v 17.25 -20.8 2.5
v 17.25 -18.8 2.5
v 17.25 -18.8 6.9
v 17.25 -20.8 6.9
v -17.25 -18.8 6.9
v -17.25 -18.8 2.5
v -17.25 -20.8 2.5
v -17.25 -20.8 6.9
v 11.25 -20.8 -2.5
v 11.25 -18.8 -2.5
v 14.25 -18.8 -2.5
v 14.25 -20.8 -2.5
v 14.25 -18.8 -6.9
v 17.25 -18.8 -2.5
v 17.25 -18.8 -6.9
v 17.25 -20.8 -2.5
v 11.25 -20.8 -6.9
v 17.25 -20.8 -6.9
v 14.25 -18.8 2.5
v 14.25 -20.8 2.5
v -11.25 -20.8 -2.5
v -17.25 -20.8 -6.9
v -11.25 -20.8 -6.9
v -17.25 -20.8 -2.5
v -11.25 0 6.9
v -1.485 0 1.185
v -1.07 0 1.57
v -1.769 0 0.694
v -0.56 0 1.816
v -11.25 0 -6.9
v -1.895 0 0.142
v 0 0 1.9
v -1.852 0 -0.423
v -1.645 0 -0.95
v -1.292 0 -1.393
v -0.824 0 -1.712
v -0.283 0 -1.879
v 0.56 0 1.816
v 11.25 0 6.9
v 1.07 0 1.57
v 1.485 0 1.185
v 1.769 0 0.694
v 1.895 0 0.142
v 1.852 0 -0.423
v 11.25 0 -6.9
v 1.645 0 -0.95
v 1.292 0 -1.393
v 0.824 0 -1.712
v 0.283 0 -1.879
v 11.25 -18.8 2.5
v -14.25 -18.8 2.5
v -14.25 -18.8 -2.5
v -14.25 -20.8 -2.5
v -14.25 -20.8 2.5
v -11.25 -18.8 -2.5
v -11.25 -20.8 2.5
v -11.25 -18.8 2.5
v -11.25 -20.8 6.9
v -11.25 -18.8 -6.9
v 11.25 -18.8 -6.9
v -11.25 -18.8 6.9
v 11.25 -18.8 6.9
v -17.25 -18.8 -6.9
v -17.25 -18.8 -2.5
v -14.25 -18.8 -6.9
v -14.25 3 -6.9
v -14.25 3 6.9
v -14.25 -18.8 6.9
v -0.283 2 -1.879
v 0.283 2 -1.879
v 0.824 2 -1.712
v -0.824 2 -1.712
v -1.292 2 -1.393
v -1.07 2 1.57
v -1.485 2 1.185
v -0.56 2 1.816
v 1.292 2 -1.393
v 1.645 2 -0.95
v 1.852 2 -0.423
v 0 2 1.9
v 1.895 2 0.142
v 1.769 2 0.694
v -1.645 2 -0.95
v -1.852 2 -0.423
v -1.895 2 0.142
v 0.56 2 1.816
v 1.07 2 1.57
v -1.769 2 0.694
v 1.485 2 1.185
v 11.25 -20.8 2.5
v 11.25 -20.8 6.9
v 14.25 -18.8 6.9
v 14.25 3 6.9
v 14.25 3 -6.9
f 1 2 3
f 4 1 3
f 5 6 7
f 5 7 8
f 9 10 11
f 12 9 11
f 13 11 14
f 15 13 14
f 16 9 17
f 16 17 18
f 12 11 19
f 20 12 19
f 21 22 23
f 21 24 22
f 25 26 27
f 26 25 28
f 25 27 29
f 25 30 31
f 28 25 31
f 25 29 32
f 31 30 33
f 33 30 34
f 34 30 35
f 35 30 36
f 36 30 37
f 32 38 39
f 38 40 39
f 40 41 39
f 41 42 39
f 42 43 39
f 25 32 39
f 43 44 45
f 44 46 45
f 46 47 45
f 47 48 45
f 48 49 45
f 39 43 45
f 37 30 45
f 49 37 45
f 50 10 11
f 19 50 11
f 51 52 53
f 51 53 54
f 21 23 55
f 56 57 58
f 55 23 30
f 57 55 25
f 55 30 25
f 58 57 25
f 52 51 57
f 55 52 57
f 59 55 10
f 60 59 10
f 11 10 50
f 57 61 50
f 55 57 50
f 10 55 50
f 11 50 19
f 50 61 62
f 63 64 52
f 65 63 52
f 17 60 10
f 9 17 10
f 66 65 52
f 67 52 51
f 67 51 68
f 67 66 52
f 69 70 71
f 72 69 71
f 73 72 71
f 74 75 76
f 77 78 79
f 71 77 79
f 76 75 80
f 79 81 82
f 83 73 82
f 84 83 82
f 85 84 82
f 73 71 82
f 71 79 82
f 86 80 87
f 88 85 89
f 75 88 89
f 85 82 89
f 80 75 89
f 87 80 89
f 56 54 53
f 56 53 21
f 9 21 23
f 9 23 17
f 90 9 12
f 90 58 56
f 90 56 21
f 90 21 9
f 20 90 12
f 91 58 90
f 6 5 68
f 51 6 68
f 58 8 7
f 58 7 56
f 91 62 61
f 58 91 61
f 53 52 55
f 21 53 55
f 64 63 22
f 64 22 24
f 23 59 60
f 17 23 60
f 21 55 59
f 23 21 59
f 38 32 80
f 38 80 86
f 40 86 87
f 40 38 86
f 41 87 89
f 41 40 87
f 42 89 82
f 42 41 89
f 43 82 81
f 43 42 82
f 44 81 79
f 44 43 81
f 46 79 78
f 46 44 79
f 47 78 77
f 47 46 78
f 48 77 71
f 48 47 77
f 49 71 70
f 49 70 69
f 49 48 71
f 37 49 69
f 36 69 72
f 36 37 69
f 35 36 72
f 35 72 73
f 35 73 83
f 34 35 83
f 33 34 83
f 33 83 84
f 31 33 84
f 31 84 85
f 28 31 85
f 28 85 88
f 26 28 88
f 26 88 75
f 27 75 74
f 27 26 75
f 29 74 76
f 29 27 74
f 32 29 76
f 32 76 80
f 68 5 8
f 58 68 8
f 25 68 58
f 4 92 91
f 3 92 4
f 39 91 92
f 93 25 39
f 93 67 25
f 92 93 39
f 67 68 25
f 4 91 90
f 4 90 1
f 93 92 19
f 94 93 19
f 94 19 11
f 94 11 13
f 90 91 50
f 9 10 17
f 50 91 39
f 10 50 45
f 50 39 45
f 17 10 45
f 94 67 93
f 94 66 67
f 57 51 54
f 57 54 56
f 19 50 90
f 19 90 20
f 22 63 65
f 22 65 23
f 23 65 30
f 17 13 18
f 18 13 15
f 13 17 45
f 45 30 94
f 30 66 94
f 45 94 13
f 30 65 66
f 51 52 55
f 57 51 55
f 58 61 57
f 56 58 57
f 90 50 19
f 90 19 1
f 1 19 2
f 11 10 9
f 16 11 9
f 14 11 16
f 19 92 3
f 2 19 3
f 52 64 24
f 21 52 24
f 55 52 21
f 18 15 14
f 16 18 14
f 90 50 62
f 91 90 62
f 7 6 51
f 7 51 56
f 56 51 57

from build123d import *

# Parameters (mm, degrees)
SKETCH1_W            = 28.5
SKETCH1_H            = 13.8
BOSS_EXTRUDE1_DEPTH  = 3
SKETCH1_4_R          = 1.9
CUT_EXTRUDE1_DEPTH   = 2
SKETCH1_6_W          = 3
SKETCH1_6_H          = 13.8
BOSS_EXTRUDE2_DEPTH  = 18.8
SKETCH3_W            = 3
SKETCH3_H            = 4.4
BOSS_EXTRUDE6_DEPTH  = 2
SKETCH3_7_W          = 3
SKETCH3_7_H          = 4.4
BOSS_EXTRUDE12_DEPTH = 2
BOSS_EXTRUDE13_DEPTH = 2


with BuildPart() as part:
    # Sketch1 → Boss-Extrude1 (new body)
    with BuildSketch(Plane(origin=(0, 0, 0), x_dir=(1, 0, 0), z_dir=(0, 1, 0))):
        Rectangle(SKETCH1_W, SKETCH1_H)
    extrude(amount=BOSS_EXTRUDE1_DEPTH)

    # Sketch1<4> → Cut-Extrude1 (cut)
    with BuildSketch(Plane(origin=(0, 0, 0), x_dir=(1, 0, 0), z_dir=(0, 1, 0))):
        Circle(SKETCH1_4_R)
    extrude(amount=CUT_EXTRUDE1_DEPTH, mode=Mode.SUBTRACT)

    # Sketch1<6> → Boss-Extrude2 (add)
    with BuildSketch(Plane(origin=(0, 0, 0), x_dir=(1, 0, 0), z_dir=(0, 1, 0))):
        with Locations((-12.75, 0)):
            Rectangle(SKETCH1_6_W, SKETCH1_6_H)
        with Locations((12.75, 0)):
            Rectangle(SKETCH1_6_W, SKETCH1_6_H)
    extrude(amount=-BOSS_EXTRUDE2_DEPTH)

    # Sketch3 → Boss-Extrude6 (add)
    with BuildSketch(Plane.XZ.offset(18.8)):
        with Locations((-12.75, -4.7)):
            Rectangle(SKETCH3_W, SKETCH3_H)
        with Locations((-12.75, 4.7)):
            Rectangle(SKETCH3_W, SKETCH3_H)
        with Locations((12.75, -4.7)):
            Rectangle(SKETCH3_W, SKETCH3_H)
        with Locations((12.75, 4.7)):
            Rectangle(SKETCH3_W, SKETCH3_H)
    extrude(amount=BOSS_EXTRUDE6_DEPTH)

    # Sketch3<7> → Boss-Extrude12 (add)
    with BuildSketch(Plane.XZ.offset(18.8)):
        with Locations((-15.75, -4.7)):
            Rectangle(SKETCH3_7_W, SKETCH3_7_H)
        with Locations((-15.75, 4.7)):
            Rectangle(SKETCH3_7_W, SKETCH3_7_H)
        with Locations((15.75, -4.7)):
            Rectangle(SKETCH3_7_W, SKETCH3_7_H)
        with Locations((15.75, 4.7)):
            Rectangle(SKETCH3_7_W, SKETCH3_7_H)
    extrude(amount=BOSS_EXTRUDE12_DEPTH)


with BuildPart() as body_2:
    # Sketch3<8> → Boss-Extrude13 (new body)
    with BuildSketch(Plane.XZ.offset(18.8)):
        Polygon((-14.25, 2.5), (-14.25, -2.5), (-11.25, -2.5), (-11.25, -6.9), (11.25, -6.9), (11.25, -2.5), (14.25, -2.5), (14.25, 2.5), (11.25, 2.5), (11.25, 6.9), (-11.25, 6.9), (-11.25, 2.5), align=None)
    extrude(amount=BOSS_EXTRUDE13_DEPTH)


solid = Compound([part.part, body_2.part])
